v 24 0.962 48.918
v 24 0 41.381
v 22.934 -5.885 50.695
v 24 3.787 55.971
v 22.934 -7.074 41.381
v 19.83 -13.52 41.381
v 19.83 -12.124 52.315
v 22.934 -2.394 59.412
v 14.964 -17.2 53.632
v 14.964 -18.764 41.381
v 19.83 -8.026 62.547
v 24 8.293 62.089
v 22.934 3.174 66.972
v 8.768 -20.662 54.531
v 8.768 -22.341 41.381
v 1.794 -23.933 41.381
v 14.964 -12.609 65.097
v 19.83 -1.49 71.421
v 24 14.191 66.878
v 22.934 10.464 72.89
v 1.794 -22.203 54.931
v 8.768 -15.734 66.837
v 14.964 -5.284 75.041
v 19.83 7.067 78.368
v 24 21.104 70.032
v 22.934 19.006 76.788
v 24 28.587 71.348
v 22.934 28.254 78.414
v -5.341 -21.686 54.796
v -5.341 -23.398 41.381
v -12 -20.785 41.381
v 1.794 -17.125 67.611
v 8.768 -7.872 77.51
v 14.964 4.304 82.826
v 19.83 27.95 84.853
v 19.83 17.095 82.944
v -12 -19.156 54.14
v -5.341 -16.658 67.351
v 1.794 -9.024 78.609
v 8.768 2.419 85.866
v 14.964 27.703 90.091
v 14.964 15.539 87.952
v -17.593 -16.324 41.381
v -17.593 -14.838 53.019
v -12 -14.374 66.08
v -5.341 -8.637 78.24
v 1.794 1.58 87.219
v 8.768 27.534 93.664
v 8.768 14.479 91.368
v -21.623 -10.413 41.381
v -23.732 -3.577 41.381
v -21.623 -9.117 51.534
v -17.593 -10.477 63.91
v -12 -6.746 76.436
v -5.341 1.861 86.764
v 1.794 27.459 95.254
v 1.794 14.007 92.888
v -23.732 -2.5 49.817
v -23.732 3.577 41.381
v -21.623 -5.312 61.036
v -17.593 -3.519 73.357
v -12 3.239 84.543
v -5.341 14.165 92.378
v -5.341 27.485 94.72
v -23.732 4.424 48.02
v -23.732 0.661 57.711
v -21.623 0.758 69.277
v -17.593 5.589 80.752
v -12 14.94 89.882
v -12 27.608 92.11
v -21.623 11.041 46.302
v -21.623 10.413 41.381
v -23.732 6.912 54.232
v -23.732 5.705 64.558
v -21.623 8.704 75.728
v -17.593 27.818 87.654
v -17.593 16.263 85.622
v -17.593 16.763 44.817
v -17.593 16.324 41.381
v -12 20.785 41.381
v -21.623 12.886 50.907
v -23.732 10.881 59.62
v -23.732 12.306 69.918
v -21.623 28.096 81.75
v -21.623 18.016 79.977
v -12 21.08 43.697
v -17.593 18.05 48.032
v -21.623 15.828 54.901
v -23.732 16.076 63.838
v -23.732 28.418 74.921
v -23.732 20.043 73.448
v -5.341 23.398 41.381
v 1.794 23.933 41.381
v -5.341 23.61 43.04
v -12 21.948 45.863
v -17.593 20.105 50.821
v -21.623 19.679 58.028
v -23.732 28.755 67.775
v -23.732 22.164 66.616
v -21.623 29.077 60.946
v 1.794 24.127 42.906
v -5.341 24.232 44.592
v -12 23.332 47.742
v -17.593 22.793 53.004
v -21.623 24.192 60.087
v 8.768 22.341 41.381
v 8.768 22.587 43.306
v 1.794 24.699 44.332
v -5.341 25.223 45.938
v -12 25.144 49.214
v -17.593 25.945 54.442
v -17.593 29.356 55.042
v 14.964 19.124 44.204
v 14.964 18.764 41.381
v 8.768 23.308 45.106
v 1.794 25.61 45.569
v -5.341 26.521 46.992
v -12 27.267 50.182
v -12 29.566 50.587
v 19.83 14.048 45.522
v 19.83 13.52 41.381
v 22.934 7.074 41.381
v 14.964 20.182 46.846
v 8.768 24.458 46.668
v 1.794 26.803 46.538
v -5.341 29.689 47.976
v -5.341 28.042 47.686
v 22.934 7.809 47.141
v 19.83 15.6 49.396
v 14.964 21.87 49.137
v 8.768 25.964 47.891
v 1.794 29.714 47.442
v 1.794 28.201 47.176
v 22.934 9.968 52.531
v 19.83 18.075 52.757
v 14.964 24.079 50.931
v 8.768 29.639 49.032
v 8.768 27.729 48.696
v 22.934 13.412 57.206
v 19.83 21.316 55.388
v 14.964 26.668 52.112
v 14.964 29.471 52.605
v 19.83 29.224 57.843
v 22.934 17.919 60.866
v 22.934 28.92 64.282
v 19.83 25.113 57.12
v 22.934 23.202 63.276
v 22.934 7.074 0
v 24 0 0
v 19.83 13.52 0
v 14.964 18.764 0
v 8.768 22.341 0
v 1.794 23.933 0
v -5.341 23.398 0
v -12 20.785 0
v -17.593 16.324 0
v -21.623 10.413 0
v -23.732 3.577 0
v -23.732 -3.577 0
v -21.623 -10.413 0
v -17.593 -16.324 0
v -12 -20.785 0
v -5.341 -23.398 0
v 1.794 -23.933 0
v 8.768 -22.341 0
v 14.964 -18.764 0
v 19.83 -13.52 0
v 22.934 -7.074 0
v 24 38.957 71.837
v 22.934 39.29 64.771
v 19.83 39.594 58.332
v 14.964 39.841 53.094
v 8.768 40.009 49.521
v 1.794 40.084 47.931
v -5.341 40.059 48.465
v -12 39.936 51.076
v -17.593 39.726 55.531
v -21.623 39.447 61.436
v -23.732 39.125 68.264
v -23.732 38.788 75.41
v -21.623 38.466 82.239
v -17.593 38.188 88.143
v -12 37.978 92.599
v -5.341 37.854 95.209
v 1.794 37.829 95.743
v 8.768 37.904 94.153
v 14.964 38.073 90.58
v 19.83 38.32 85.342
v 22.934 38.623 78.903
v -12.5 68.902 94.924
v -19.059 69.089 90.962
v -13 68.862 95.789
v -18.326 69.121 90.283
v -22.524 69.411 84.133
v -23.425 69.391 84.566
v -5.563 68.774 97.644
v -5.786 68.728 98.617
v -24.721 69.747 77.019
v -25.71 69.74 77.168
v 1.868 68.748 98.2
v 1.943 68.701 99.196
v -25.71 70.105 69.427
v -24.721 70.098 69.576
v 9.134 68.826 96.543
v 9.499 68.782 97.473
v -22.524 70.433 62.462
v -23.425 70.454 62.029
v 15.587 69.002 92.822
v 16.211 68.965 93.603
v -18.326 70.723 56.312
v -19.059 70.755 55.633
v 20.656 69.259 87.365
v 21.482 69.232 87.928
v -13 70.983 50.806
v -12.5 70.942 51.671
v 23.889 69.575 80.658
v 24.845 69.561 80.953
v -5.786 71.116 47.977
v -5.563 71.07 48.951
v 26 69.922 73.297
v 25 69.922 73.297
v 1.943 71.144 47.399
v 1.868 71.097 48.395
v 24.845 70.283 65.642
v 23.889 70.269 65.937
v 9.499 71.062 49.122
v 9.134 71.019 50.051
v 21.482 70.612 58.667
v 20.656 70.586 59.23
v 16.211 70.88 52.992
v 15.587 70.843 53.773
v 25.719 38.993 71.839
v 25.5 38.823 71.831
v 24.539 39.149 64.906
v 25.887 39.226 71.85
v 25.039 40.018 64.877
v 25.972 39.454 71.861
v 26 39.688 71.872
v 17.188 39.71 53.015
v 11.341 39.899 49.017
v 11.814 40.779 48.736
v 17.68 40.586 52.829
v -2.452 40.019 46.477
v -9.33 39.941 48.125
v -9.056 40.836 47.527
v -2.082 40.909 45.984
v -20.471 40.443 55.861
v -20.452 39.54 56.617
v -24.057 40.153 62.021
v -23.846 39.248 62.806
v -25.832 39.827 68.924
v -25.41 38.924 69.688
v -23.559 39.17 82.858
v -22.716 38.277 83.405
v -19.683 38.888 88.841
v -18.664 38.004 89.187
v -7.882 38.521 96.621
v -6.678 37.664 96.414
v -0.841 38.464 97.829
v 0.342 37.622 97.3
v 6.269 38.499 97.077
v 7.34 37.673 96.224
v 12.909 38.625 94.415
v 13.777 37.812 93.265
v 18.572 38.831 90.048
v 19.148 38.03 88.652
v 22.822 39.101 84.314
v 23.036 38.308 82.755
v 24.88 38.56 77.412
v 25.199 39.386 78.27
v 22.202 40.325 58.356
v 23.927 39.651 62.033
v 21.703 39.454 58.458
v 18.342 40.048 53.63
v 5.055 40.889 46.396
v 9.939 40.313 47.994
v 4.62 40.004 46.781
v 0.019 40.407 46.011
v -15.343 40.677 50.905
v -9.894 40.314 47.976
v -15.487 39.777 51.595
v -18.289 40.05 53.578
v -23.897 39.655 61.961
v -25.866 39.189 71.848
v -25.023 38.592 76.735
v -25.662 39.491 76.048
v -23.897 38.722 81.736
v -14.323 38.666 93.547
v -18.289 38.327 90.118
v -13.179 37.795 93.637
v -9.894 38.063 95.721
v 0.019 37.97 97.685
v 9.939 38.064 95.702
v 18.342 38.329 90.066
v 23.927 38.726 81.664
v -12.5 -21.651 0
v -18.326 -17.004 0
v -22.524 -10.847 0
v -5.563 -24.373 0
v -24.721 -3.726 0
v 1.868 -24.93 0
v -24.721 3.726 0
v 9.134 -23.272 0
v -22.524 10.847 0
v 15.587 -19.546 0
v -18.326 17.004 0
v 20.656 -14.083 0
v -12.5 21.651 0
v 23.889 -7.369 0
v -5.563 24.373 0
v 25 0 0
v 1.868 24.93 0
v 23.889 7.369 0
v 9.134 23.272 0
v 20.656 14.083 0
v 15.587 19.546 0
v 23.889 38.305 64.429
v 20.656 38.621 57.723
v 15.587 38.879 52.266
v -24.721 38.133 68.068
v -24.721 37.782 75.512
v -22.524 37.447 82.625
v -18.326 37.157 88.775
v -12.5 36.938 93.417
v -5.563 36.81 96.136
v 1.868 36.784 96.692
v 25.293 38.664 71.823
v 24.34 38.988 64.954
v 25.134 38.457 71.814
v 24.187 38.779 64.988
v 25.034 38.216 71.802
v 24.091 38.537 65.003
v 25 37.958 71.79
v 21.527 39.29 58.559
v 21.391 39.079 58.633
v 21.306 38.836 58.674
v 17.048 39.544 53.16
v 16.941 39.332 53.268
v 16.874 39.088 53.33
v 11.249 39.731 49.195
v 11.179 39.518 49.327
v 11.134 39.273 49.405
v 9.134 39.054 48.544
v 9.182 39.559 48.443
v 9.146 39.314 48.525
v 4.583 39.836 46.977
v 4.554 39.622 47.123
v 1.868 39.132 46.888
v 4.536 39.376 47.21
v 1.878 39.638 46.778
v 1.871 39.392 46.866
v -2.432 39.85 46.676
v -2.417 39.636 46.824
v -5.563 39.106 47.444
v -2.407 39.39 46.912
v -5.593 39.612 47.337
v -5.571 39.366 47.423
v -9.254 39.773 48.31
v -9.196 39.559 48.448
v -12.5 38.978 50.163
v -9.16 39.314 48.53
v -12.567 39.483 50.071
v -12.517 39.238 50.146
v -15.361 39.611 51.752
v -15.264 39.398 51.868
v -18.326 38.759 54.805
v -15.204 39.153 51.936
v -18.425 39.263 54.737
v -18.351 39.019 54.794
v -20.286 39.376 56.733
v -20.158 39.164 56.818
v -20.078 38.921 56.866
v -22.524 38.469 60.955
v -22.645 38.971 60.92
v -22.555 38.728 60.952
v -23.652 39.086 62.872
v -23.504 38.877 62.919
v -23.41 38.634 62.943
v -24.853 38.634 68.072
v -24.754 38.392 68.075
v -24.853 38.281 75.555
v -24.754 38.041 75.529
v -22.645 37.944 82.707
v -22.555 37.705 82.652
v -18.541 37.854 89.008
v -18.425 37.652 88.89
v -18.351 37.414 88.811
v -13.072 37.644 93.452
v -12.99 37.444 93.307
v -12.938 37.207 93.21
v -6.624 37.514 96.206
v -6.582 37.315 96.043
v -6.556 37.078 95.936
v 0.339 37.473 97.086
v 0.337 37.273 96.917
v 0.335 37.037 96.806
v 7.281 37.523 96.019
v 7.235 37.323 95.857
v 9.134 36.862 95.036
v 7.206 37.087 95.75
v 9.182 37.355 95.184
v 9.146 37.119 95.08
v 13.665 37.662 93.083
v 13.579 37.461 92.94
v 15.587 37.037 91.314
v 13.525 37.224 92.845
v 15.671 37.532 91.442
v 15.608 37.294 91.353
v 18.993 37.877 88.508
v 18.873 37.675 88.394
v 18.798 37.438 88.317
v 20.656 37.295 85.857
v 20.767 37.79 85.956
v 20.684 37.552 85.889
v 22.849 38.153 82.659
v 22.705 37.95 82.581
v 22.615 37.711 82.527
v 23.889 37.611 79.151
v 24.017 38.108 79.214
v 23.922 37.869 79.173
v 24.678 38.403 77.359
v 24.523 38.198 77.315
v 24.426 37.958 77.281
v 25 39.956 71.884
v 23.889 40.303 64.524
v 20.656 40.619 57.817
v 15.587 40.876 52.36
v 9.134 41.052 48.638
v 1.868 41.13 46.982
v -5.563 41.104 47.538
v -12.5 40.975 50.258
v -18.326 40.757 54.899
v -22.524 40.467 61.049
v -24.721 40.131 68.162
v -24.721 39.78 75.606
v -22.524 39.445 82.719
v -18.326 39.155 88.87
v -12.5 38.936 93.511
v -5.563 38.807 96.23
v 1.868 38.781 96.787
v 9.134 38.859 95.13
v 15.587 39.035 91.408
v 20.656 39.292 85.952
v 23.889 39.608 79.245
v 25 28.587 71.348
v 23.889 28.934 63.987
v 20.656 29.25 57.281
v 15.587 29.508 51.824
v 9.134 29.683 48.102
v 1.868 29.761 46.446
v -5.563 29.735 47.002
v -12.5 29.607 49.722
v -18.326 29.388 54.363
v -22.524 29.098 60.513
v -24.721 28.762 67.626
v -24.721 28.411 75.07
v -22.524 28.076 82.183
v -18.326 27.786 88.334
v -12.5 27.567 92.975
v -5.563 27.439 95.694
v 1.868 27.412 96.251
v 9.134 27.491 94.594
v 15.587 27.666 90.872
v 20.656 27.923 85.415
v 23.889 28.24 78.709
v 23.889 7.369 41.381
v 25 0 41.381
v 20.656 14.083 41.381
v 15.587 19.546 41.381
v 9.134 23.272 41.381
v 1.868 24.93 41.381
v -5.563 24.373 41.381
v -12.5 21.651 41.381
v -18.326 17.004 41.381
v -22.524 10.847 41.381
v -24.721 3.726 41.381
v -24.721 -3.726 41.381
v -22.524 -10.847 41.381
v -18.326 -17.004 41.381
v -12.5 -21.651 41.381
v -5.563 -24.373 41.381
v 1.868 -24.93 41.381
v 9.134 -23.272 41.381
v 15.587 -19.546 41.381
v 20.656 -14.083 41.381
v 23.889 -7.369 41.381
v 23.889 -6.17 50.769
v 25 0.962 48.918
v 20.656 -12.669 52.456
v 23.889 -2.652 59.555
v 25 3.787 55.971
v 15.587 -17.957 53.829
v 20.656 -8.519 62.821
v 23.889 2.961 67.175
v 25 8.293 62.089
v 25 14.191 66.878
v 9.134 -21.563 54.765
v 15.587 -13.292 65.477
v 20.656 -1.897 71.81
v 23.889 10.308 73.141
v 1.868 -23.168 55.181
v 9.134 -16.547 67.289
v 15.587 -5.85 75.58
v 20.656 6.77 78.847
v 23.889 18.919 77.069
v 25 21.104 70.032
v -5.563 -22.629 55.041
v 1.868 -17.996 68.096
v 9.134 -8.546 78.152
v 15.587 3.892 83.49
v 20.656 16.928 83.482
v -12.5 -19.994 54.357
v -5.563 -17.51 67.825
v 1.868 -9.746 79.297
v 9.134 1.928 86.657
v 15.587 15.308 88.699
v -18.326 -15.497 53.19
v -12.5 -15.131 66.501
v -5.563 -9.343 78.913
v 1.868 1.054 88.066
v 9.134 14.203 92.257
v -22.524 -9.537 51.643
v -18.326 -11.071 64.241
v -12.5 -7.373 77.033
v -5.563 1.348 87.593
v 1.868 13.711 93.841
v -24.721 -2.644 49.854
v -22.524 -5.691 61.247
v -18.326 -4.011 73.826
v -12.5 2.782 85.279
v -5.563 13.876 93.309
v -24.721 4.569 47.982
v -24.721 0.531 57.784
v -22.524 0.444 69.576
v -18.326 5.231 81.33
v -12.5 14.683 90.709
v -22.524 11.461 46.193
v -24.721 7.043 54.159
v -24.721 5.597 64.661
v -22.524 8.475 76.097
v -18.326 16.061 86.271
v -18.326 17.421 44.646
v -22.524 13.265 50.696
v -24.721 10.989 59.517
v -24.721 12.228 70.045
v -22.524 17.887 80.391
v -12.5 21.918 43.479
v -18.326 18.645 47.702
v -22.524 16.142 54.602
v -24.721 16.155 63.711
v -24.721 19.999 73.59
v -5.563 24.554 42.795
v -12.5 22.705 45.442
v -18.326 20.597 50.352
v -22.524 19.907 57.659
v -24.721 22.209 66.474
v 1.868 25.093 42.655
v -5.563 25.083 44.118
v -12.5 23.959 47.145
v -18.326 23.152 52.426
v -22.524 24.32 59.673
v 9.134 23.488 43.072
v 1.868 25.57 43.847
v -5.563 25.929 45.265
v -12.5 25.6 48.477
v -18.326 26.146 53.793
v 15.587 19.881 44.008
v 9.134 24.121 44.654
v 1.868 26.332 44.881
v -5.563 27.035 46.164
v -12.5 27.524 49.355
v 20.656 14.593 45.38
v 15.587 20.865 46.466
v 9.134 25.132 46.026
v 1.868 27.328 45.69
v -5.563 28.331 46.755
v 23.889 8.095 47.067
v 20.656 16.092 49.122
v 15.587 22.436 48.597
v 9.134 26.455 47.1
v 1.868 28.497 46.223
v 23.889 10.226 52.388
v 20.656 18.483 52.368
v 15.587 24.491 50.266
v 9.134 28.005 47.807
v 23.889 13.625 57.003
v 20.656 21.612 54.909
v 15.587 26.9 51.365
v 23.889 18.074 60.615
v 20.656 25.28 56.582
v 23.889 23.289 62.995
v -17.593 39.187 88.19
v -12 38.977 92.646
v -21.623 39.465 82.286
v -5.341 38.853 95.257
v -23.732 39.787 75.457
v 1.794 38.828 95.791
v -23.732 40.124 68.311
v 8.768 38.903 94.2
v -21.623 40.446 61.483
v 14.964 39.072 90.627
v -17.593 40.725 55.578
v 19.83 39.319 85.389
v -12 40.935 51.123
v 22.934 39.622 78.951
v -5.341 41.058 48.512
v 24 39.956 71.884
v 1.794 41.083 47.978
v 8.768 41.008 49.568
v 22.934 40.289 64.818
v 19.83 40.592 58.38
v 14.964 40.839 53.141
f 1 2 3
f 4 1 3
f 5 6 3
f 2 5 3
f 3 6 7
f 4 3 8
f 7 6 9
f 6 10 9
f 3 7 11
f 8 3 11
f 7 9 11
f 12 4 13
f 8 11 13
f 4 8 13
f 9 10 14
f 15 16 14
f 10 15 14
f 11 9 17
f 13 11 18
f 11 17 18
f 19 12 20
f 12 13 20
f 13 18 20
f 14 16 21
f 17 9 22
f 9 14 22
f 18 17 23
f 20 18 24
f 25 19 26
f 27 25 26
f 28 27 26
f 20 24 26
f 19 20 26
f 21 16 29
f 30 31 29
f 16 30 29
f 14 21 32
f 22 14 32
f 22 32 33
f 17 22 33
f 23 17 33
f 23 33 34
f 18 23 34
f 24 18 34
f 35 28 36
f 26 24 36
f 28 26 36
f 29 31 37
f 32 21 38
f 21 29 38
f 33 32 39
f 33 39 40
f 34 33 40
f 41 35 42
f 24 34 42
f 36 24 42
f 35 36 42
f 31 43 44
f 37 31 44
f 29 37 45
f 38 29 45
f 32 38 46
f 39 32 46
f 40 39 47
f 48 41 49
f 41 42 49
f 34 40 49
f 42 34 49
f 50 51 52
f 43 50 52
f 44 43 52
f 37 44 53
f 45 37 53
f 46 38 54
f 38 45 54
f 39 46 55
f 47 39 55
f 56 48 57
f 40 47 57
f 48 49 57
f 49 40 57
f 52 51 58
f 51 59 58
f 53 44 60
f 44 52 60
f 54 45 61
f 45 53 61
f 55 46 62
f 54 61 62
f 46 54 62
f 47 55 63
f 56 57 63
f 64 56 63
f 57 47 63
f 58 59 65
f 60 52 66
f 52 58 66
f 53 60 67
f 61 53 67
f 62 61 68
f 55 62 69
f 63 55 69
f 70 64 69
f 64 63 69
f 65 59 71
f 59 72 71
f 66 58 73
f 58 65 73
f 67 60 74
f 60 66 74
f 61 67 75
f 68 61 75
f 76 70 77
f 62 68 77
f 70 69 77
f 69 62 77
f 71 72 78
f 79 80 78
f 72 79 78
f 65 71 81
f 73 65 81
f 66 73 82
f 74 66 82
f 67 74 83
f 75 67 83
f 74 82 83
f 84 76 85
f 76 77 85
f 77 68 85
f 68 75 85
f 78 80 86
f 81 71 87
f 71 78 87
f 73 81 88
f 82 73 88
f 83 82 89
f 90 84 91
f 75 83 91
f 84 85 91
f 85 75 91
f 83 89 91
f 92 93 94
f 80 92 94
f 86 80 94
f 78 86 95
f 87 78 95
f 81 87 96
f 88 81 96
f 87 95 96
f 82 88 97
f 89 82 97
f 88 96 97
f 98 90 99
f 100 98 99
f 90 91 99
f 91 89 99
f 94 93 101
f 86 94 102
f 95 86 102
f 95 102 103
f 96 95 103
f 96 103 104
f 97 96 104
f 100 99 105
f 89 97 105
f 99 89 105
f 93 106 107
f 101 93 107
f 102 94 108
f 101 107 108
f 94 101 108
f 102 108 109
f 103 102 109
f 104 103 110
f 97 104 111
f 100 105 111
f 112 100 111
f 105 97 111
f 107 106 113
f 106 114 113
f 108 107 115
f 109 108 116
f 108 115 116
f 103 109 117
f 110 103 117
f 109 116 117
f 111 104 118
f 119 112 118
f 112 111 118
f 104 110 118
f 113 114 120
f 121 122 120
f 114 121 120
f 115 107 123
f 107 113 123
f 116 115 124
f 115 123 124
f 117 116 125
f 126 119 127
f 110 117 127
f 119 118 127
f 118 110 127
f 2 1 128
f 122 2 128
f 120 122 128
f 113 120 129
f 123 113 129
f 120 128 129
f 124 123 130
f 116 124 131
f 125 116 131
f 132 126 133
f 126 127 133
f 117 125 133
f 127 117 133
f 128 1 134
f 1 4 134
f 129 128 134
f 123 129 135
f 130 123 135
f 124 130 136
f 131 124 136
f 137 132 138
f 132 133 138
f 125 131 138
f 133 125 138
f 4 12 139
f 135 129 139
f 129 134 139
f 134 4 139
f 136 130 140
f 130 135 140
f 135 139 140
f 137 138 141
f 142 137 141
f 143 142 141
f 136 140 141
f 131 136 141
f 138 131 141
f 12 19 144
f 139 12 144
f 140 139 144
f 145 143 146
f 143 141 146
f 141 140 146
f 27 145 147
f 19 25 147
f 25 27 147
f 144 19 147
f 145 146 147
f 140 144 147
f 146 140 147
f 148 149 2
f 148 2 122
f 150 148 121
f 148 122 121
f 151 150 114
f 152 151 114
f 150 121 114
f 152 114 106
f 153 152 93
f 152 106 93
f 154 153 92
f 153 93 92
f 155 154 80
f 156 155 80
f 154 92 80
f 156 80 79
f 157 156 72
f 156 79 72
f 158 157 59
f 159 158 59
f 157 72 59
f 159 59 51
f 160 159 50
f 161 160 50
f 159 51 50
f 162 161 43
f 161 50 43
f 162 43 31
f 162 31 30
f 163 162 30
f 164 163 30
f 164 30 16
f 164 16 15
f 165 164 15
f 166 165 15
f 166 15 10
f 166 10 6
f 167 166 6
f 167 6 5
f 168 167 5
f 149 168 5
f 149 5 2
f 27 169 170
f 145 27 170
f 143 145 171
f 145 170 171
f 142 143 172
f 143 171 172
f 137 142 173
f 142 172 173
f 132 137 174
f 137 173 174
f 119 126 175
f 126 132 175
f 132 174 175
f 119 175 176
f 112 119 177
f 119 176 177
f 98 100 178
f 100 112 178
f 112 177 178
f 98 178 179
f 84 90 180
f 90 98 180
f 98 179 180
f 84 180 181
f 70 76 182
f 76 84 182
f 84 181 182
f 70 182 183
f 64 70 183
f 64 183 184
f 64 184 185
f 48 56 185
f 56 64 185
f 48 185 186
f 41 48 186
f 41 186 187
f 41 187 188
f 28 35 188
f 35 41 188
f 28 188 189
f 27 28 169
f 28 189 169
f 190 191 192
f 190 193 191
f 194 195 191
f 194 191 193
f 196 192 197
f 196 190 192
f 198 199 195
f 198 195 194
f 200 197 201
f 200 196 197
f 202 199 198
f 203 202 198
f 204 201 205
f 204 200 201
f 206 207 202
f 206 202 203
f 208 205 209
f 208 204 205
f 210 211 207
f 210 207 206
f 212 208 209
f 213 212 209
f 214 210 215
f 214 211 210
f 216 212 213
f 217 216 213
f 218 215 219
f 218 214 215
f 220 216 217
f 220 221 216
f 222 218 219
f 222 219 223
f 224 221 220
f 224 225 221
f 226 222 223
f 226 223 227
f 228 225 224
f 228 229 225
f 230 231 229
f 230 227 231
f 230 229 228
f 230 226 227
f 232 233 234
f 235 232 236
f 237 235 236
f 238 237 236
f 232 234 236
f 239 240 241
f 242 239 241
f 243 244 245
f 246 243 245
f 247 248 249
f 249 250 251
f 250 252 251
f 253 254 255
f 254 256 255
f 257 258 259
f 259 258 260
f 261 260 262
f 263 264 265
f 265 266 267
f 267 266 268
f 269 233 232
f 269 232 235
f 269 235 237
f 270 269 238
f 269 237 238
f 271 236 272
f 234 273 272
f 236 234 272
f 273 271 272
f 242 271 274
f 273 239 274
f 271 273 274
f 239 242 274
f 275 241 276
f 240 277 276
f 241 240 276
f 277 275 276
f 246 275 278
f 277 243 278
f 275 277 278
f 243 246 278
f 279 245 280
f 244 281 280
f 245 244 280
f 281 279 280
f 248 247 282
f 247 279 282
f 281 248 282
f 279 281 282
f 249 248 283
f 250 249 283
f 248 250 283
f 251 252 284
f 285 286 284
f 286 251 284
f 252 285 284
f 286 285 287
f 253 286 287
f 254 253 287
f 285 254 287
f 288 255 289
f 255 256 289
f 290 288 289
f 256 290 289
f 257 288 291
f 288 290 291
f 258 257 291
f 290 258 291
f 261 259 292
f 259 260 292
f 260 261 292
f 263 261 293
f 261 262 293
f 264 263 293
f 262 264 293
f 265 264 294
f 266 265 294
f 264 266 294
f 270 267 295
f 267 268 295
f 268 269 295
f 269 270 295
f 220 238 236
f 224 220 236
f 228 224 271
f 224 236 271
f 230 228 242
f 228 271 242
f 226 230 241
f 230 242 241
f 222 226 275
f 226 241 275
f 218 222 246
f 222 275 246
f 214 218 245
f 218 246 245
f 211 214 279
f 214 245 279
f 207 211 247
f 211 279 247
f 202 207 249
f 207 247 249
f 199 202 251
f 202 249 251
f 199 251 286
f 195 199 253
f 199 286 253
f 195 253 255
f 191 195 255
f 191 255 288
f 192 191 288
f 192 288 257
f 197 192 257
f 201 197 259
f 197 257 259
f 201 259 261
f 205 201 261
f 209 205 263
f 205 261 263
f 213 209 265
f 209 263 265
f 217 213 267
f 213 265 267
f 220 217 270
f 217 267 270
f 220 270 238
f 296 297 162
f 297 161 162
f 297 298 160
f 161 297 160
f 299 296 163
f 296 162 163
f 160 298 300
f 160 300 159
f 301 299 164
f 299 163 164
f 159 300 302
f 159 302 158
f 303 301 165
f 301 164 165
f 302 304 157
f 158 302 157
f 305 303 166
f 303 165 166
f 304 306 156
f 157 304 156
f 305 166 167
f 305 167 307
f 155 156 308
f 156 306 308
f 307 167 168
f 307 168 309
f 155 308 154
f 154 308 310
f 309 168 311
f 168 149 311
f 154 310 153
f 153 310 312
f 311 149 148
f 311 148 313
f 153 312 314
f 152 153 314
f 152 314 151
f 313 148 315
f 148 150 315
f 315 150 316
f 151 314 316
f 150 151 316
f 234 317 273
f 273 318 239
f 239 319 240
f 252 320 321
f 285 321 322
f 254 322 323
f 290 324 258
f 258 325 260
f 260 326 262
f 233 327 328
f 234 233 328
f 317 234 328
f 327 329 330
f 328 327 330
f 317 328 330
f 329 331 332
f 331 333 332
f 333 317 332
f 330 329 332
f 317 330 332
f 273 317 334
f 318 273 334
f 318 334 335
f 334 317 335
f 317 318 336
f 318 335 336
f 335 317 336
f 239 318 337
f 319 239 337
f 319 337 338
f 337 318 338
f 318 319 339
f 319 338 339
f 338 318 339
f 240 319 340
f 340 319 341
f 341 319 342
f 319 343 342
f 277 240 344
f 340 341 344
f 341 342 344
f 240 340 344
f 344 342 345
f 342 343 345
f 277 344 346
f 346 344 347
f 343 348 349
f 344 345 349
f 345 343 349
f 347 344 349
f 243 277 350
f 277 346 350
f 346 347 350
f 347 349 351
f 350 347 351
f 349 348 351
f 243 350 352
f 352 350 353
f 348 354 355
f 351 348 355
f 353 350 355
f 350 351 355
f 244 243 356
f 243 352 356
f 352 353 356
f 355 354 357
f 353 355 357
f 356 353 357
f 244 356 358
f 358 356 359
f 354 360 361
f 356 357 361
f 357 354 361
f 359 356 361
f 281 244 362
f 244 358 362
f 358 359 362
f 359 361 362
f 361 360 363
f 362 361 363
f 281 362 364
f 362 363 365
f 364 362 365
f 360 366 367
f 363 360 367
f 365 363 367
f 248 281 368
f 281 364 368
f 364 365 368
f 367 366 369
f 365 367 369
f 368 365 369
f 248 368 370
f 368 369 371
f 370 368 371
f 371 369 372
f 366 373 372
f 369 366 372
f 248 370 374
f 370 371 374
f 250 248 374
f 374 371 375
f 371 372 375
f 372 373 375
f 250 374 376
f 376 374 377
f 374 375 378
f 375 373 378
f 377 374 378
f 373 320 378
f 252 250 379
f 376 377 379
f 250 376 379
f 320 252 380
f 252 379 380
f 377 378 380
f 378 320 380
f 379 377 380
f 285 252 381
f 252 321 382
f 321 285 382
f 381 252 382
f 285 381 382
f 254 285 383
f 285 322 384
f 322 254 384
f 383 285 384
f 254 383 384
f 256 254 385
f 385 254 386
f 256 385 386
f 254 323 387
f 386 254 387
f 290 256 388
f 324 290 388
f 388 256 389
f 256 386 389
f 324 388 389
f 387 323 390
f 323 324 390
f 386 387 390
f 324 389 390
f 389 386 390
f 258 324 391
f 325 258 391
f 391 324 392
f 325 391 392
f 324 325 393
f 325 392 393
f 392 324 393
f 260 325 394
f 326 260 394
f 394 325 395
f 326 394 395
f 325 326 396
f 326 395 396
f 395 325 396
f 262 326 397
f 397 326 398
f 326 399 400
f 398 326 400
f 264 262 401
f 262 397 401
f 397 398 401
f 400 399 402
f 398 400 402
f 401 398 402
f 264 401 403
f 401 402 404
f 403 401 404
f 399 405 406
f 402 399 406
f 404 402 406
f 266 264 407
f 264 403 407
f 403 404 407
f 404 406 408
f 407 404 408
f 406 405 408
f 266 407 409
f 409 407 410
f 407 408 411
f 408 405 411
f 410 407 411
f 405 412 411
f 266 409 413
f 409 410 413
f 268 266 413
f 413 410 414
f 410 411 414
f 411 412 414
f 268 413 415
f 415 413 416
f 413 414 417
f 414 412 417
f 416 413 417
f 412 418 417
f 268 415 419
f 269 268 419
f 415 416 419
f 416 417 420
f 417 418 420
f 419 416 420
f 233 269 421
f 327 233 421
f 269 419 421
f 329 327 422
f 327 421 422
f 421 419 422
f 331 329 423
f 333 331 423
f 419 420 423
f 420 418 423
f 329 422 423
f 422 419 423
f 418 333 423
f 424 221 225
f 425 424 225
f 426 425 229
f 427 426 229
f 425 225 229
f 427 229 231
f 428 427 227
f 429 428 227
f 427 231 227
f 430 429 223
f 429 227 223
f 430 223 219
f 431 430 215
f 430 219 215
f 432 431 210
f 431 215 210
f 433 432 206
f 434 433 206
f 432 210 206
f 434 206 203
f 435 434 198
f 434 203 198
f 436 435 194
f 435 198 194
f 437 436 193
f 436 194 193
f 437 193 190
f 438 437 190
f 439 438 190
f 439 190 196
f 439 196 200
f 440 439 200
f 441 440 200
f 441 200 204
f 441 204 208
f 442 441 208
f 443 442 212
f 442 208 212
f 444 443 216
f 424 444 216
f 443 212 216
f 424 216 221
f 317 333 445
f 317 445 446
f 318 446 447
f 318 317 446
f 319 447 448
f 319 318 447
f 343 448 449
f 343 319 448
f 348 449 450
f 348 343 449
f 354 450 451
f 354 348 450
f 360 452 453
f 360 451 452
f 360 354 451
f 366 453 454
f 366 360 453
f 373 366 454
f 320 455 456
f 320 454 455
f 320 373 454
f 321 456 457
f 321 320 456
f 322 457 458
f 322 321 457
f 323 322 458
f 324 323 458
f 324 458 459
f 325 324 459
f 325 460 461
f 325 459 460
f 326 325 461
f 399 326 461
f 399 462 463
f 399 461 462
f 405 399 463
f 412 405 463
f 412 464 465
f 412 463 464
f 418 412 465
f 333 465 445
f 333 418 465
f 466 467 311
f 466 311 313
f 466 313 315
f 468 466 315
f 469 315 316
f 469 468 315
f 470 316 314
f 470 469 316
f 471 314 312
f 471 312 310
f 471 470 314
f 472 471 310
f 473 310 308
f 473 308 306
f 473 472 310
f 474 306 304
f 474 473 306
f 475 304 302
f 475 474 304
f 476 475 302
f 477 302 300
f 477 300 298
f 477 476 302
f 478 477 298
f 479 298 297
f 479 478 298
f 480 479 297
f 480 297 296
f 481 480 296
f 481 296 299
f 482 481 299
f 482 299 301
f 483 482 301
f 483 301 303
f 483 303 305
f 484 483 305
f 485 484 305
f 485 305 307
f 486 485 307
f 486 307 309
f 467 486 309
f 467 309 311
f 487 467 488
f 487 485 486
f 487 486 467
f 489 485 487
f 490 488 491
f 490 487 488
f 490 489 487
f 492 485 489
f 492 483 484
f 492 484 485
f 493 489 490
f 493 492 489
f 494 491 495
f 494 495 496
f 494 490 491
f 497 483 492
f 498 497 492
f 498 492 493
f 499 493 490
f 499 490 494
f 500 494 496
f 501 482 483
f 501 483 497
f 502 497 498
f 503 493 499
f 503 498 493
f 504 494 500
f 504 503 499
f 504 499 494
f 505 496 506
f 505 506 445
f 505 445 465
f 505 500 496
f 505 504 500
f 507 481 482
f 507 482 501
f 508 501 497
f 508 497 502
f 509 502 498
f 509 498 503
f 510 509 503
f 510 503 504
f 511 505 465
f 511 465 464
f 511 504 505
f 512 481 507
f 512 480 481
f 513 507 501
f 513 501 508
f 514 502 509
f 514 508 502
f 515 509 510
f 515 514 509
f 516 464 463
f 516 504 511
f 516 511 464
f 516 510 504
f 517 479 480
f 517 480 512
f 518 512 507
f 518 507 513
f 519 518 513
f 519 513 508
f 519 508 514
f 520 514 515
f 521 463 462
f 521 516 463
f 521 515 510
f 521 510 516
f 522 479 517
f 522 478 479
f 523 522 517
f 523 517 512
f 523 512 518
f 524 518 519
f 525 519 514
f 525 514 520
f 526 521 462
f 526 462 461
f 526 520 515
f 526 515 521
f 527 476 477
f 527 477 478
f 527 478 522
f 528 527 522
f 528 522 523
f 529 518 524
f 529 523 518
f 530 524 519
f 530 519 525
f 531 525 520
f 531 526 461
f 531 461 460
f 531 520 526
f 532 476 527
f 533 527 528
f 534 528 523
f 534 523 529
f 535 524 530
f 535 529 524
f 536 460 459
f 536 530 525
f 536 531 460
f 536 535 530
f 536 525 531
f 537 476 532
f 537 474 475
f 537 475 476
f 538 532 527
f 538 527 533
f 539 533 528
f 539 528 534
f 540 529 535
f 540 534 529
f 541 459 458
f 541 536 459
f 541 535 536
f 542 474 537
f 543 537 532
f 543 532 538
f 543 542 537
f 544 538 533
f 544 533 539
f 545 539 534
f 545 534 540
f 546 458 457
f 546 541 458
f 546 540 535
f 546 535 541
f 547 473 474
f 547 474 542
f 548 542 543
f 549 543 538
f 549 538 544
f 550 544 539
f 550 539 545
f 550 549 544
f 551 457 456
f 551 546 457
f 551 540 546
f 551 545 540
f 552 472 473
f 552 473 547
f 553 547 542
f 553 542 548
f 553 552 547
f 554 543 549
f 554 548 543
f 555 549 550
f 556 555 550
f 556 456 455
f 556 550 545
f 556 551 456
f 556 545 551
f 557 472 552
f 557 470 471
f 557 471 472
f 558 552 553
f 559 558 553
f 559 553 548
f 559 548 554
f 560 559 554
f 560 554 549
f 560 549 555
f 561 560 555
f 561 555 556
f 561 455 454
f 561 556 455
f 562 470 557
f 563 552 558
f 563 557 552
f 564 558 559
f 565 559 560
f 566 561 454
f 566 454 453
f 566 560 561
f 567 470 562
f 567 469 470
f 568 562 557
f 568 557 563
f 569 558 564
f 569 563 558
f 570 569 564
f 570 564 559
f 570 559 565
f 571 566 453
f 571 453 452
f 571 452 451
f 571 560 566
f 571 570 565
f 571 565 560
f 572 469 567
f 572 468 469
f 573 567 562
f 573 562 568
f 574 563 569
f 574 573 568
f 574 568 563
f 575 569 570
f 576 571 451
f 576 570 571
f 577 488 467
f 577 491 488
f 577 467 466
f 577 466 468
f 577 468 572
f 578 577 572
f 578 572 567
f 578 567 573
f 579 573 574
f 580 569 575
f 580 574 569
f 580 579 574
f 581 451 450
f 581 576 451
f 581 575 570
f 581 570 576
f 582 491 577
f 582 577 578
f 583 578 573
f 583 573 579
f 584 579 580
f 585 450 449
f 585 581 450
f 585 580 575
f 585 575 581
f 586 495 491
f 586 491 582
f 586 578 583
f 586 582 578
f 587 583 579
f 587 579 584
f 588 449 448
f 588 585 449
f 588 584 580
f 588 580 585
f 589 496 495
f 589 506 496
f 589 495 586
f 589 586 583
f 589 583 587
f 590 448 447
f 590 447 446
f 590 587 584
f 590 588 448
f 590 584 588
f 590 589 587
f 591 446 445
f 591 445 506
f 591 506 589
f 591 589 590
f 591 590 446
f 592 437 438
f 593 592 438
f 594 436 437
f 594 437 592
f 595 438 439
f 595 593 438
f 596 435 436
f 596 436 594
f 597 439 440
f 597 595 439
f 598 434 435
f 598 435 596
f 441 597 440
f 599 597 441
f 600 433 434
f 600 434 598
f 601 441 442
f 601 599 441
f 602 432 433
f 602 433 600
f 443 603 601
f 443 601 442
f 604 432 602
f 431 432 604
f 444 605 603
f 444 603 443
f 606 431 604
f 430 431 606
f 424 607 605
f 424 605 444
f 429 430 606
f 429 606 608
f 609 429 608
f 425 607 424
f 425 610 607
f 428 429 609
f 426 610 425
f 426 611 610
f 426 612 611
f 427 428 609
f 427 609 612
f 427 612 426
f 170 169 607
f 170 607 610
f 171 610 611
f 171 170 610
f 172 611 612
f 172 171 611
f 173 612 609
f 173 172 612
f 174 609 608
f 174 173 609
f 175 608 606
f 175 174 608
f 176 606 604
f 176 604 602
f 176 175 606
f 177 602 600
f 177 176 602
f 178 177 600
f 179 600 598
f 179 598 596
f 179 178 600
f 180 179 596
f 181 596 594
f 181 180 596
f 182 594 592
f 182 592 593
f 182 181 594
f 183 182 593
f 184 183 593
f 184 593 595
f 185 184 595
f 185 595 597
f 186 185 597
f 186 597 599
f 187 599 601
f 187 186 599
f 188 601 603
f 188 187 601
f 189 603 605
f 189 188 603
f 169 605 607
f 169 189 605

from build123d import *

# Parameters (mm, degrees)
ESQUISSE6_R        = 25
ESQUISSE6_R_2      = 24
ESQUISSE8_R        = 26.000000000000007
ESQUISSE8_R_2      = 24.000000000000007
EXTRU_MINCE1_DEPTH = 1
EXTRU_MINCE2_START = 30
ESQUISSE9_R        = 26
ESQUISSE9_R_2      = 25
EXTRU_MINCE2_DEPTH = 30
CONG_1_R           = 1
CONG_2_R           = 1


with BuildPart() as part:
    # Balayage-Mince2: sweep along a path in Esquisse7
    with BuildLine(Plane(origin=(0, 0, 0), x_dir=(0, 0, -1), z_dir=(1, 0, 0))) as balayage_mince2_path:
        Line((0, 0), (-41.38142332276701, -3.47e-15))
        ThreePointArc((-41.38142332276701, -3.47e-15), (-62.08896052980016, 8.292906624346546), (-71.34811957162613, 28.58680647871081))
        Line((-71.34811957162613, 28.58680647871081), (-71.83715157767594, 38.95670512351683))
    # Esquisse6 → Balayage-Mince2 (sweep)
    with BuildSketch(Plane.XY):
        Circle(ESQUISSE6_R)
        Circle(ESQUISSE6_R_2, mode=Mode.SUBTRACT)
    sweep(path=balayage_mince2_path.line)



with BuildPart() as body_2:
    # Esquisse8 → Extru.-Mince1 (new body)
    with BuildSketch(Plane(origin=(0, 42.25049608966464, 1.9924828165681323), x_dir=(1, 0, 0), z_dir=(0, 0.9988898749619701, 0.047106450709639855))):
        with Locations((0, -69.92229124733788)):
            Circle(ESQUISSE8_R)
        with Locations((0, -69.92229124733788)):
            Circle(ESQUISSE8_R_2, mode=Mode.SUBTRACT)
    extrude(amount=EXTRU_MINCE1_DEPTH)


with BuildPart() as part_1:
    add(part.part)

    add(body_2.part)  # Extru.-Mince2 merges body 2
    # Esquisse9 → Extru.-Mince2 (add)
    with BuildSketch(Plane(origin=(0, 43.249385964626626, 2.039589267277776), x_dir=(1, 0, 0), z_dir=(0, 0.9988898749619701, 0.04710645070963987)).offset(EXTRU_MINCE2_START)):
        with Locations((0, -69.92229124733788)):
            Circle(ESQUISSE9_R)
        with Locations((0, -69.92229124733788)):
            Circle(ESQUISSE9_R_2, mode=Mode.SUBTRACT)
    extrude(amount=-EXTRU_MINCE2_DEPTH)

    # Congé1
    cong_1_edges = [part_1.edges().sort_by_distance(p)[0] for p in [
        (-25, 38.95670512351683, 71.8371515776759),
    ]]
    fillet(cong_1_edges, radius=CONG_1_R - 0.0001)  # a hair under: the kernel refuses the full size

    # Congé2
    cong_2_edges = [part_1.edges().sort_by_distance(p)[0] for p in [
        (-26.000000000000007, 38.956705123516834, 71.83715157767593),
    ]]
    fillet(cong_2_edges, radius=CONG_2_R)


solid = part_1.part
